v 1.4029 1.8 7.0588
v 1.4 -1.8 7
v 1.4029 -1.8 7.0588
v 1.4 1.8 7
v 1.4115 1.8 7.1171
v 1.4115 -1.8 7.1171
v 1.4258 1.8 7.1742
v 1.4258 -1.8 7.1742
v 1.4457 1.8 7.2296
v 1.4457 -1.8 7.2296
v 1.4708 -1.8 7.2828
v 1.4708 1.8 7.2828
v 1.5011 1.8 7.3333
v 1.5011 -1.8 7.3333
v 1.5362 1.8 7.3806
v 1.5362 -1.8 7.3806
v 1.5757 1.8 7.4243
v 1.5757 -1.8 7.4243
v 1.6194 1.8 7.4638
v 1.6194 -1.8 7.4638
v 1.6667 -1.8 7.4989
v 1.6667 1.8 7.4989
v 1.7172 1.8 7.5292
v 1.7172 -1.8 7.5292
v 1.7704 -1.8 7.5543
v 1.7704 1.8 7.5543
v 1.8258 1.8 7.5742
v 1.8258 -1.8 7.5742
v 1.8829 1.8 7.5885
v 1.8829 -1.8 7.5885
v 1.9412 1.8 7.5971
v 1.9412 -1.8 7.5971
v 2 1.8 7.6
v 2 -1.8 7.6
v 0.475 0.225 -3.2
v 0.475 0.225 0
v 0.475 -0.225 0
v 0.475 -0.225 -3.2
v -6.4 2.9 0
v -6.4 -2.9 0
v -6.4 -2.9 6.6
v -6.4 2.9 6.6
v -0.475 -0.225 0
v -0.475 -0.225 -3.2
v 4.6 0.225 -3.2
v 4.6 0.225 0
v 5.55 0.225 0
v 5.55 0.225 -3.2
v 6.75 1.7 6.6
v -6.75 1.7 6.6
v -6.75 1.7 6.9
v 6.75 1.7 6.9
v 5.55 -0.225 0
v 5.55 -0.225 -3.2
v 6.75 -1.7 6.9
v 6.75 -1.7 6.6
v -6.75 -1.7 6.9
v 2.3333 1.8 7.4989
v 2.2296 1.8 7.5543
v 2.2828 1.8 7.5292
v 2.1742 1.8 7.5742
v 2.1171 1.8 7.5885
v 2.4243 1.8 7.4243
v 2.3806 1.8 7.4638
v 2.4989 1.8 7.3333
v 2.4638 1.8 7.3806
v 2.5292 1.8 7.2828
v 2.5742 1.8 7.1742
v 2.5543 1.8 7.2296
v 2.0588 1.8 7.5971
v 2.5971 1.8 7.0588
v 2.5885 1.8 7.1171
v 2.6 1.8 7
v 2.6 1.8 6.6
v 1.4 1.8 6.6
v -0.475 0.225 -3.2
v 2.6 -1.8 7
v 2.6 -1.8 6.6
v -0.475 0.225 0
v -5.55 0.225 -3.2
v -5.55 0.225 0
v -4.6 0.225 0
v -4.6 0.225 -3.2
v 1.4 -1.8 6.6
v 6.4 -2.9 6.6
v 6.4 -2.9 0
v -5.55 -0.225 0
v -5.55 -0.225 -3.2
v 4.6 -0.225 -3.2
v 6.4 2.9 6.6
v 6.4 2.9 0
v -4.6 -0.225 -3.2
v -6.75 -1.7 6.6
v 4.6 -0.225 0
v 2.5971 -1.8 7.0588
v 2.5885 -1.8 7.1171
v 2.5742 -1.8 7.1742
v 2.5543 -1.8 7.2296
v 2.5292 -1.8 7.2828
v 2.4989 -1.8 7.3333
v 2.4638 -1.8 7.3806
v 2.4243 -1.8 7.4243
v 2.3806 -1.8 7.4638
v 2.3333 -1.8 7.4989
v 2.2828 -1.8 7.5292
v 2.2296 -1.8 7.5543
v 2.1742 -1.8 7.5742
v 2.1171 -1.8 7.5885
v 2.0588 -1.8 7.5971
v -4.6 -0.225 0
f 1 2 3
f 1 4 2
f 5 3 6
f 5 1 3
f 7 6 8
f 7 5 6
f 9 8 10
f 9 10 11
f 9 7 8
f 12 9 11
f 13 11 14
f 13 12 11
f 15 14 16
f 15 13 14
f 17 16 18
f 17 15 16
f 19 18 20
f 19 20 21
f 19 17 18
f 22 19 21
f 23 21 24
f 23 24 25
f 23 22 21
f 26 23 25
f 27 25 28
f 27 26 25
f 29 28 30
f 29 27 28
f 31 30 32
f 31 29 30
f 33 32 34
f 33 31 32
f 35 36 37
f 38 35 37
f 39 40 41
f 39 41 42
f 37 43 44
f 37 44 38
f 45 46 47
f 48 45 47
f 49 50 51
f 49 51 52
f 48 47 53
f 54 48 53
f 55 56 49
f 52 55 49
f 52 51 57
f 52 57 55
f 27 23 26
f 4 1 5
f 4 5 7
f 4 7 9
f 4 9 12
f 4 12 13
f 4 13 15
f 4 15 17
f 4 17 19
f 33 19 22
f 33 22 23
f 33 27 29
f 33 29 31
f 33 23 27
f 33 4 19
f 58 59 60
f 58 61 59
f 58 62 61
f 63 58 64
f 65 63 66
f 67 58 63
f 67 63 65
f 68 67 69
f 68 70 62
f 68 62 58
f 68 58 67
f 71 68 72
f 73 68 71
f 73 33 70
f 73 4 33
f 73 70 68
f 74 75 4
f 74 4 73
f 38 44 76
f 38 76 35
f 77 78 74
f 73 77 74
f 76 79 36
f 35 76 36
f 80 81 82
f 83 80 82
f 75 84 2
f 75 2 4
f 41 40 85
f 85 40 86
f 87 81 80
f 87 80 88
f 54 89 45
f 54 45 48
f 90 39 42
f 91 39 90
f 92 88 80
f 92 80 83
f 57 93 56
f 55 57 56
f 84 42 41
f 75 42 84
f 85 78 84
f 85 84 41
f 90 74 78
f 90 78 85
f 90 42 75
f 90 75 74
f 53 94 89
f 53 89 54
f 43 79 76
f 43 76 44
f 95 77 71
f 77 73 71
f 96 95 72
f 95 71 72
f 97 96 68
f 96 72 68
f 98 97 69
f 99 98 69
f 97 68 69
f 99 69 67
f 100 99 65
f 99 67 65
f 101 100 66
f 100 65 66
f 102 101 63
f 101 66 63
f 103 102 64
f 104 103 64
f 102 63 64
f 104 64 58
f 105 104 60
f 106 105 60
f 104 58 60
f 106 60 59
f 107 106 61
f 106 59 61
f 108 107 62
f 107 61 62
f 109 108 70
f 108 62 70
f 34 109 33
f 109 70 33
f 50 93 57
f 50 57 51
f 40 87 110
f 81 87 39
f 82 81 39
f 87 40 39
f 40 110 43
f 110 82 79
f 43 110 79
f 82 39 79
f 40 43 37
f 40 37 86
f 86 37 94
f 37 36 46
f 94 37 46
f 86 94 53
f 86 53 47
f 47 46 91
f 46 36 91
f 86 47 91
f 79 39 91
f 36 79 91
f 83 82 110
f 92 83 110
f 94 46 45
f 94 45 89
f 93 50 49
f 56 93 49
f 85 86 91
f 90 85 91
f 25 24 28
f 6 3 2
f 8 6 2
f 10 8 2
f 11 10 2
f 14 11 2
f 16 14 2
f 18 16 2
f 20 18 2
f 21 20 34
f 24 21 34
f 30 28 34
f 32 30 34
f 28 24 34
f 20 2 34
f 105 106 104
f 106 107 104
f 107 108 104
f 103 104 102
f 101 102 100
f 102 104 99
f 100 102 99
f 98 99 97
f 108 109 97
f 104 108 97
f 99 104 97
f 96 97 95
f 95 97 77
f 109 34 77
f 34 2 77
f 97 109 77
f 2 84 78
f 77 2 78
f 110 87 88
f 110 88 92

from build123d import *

# Parameters (mm, degrees)
F0_W     = 12.8
F0_H     = 5.8
F1_DEPTH = 6.6
F2_W     = 0.95
F2_H     = 0.45
F3_DEPTH = 3.2
F4_W     = 1.2
F4_H     = 3.6
F5_DEPTH = 1
F6_R     = 0.59999
F7_W     = 13.5
F7_H     = 3.4
F8_DEPTH = 0.3


# Not quite as in the source:
# - a fillet or chamfer is up to 0.001 mm smaller than in the source, because OpenCascade refuses the exact size


with BuildPart() as f1:
    # F0 (on Top) → F1 (new body)
    with BuildSketch(Plane.XY):
        Rectangle(F0_W, F0_H)
    extrude(amount=F1_DEPTH)

    # F2 (on face) → F3 (join)
    with BuildSketch(Plane(origin=(0, 0, 0), x_dir=(1, 0, 0), z_dir=(0, 0, -1))):
        with Locations((-5.075, 0)):
            Rectangle(F2_W, F2_H)
        Rectangle(F2_W, F2_H)
        with Locations((5.075, 0)):
            Rectangle(F2_W, F2_H)
    extrude(amount=F3_DEPTH)

    # F4 (on face) → F5 (join)
    with BuildSketch(Plane.XY.offset(6.6)):
        with Locations((2, 0)):
            Rectangle(F4_W, F4_H)
    extrude(amount=F5_DEPTH)

    # F6 (radius 0.6 in the source; OpenCascade refuses exactly that, so slightly less here)
    f6_edges = [f1.edges().sort_by_distance(p)[0] for p in [
        (1.4, 0, 7.6),
        (2.6, 0, 7.6),
    ]]
    fillet(f6_edges, radius=F6_R)


with BuildPart() as f8:
    # F7 (on face) → F8 (new body)
    with BuildSketch(Plane.XY.offset(6.6)):
        Rectangle(F7_W, F7_H)
    extrude(amount=F8_DEPTH)


solid = Compound([f1.part, f8.part])
